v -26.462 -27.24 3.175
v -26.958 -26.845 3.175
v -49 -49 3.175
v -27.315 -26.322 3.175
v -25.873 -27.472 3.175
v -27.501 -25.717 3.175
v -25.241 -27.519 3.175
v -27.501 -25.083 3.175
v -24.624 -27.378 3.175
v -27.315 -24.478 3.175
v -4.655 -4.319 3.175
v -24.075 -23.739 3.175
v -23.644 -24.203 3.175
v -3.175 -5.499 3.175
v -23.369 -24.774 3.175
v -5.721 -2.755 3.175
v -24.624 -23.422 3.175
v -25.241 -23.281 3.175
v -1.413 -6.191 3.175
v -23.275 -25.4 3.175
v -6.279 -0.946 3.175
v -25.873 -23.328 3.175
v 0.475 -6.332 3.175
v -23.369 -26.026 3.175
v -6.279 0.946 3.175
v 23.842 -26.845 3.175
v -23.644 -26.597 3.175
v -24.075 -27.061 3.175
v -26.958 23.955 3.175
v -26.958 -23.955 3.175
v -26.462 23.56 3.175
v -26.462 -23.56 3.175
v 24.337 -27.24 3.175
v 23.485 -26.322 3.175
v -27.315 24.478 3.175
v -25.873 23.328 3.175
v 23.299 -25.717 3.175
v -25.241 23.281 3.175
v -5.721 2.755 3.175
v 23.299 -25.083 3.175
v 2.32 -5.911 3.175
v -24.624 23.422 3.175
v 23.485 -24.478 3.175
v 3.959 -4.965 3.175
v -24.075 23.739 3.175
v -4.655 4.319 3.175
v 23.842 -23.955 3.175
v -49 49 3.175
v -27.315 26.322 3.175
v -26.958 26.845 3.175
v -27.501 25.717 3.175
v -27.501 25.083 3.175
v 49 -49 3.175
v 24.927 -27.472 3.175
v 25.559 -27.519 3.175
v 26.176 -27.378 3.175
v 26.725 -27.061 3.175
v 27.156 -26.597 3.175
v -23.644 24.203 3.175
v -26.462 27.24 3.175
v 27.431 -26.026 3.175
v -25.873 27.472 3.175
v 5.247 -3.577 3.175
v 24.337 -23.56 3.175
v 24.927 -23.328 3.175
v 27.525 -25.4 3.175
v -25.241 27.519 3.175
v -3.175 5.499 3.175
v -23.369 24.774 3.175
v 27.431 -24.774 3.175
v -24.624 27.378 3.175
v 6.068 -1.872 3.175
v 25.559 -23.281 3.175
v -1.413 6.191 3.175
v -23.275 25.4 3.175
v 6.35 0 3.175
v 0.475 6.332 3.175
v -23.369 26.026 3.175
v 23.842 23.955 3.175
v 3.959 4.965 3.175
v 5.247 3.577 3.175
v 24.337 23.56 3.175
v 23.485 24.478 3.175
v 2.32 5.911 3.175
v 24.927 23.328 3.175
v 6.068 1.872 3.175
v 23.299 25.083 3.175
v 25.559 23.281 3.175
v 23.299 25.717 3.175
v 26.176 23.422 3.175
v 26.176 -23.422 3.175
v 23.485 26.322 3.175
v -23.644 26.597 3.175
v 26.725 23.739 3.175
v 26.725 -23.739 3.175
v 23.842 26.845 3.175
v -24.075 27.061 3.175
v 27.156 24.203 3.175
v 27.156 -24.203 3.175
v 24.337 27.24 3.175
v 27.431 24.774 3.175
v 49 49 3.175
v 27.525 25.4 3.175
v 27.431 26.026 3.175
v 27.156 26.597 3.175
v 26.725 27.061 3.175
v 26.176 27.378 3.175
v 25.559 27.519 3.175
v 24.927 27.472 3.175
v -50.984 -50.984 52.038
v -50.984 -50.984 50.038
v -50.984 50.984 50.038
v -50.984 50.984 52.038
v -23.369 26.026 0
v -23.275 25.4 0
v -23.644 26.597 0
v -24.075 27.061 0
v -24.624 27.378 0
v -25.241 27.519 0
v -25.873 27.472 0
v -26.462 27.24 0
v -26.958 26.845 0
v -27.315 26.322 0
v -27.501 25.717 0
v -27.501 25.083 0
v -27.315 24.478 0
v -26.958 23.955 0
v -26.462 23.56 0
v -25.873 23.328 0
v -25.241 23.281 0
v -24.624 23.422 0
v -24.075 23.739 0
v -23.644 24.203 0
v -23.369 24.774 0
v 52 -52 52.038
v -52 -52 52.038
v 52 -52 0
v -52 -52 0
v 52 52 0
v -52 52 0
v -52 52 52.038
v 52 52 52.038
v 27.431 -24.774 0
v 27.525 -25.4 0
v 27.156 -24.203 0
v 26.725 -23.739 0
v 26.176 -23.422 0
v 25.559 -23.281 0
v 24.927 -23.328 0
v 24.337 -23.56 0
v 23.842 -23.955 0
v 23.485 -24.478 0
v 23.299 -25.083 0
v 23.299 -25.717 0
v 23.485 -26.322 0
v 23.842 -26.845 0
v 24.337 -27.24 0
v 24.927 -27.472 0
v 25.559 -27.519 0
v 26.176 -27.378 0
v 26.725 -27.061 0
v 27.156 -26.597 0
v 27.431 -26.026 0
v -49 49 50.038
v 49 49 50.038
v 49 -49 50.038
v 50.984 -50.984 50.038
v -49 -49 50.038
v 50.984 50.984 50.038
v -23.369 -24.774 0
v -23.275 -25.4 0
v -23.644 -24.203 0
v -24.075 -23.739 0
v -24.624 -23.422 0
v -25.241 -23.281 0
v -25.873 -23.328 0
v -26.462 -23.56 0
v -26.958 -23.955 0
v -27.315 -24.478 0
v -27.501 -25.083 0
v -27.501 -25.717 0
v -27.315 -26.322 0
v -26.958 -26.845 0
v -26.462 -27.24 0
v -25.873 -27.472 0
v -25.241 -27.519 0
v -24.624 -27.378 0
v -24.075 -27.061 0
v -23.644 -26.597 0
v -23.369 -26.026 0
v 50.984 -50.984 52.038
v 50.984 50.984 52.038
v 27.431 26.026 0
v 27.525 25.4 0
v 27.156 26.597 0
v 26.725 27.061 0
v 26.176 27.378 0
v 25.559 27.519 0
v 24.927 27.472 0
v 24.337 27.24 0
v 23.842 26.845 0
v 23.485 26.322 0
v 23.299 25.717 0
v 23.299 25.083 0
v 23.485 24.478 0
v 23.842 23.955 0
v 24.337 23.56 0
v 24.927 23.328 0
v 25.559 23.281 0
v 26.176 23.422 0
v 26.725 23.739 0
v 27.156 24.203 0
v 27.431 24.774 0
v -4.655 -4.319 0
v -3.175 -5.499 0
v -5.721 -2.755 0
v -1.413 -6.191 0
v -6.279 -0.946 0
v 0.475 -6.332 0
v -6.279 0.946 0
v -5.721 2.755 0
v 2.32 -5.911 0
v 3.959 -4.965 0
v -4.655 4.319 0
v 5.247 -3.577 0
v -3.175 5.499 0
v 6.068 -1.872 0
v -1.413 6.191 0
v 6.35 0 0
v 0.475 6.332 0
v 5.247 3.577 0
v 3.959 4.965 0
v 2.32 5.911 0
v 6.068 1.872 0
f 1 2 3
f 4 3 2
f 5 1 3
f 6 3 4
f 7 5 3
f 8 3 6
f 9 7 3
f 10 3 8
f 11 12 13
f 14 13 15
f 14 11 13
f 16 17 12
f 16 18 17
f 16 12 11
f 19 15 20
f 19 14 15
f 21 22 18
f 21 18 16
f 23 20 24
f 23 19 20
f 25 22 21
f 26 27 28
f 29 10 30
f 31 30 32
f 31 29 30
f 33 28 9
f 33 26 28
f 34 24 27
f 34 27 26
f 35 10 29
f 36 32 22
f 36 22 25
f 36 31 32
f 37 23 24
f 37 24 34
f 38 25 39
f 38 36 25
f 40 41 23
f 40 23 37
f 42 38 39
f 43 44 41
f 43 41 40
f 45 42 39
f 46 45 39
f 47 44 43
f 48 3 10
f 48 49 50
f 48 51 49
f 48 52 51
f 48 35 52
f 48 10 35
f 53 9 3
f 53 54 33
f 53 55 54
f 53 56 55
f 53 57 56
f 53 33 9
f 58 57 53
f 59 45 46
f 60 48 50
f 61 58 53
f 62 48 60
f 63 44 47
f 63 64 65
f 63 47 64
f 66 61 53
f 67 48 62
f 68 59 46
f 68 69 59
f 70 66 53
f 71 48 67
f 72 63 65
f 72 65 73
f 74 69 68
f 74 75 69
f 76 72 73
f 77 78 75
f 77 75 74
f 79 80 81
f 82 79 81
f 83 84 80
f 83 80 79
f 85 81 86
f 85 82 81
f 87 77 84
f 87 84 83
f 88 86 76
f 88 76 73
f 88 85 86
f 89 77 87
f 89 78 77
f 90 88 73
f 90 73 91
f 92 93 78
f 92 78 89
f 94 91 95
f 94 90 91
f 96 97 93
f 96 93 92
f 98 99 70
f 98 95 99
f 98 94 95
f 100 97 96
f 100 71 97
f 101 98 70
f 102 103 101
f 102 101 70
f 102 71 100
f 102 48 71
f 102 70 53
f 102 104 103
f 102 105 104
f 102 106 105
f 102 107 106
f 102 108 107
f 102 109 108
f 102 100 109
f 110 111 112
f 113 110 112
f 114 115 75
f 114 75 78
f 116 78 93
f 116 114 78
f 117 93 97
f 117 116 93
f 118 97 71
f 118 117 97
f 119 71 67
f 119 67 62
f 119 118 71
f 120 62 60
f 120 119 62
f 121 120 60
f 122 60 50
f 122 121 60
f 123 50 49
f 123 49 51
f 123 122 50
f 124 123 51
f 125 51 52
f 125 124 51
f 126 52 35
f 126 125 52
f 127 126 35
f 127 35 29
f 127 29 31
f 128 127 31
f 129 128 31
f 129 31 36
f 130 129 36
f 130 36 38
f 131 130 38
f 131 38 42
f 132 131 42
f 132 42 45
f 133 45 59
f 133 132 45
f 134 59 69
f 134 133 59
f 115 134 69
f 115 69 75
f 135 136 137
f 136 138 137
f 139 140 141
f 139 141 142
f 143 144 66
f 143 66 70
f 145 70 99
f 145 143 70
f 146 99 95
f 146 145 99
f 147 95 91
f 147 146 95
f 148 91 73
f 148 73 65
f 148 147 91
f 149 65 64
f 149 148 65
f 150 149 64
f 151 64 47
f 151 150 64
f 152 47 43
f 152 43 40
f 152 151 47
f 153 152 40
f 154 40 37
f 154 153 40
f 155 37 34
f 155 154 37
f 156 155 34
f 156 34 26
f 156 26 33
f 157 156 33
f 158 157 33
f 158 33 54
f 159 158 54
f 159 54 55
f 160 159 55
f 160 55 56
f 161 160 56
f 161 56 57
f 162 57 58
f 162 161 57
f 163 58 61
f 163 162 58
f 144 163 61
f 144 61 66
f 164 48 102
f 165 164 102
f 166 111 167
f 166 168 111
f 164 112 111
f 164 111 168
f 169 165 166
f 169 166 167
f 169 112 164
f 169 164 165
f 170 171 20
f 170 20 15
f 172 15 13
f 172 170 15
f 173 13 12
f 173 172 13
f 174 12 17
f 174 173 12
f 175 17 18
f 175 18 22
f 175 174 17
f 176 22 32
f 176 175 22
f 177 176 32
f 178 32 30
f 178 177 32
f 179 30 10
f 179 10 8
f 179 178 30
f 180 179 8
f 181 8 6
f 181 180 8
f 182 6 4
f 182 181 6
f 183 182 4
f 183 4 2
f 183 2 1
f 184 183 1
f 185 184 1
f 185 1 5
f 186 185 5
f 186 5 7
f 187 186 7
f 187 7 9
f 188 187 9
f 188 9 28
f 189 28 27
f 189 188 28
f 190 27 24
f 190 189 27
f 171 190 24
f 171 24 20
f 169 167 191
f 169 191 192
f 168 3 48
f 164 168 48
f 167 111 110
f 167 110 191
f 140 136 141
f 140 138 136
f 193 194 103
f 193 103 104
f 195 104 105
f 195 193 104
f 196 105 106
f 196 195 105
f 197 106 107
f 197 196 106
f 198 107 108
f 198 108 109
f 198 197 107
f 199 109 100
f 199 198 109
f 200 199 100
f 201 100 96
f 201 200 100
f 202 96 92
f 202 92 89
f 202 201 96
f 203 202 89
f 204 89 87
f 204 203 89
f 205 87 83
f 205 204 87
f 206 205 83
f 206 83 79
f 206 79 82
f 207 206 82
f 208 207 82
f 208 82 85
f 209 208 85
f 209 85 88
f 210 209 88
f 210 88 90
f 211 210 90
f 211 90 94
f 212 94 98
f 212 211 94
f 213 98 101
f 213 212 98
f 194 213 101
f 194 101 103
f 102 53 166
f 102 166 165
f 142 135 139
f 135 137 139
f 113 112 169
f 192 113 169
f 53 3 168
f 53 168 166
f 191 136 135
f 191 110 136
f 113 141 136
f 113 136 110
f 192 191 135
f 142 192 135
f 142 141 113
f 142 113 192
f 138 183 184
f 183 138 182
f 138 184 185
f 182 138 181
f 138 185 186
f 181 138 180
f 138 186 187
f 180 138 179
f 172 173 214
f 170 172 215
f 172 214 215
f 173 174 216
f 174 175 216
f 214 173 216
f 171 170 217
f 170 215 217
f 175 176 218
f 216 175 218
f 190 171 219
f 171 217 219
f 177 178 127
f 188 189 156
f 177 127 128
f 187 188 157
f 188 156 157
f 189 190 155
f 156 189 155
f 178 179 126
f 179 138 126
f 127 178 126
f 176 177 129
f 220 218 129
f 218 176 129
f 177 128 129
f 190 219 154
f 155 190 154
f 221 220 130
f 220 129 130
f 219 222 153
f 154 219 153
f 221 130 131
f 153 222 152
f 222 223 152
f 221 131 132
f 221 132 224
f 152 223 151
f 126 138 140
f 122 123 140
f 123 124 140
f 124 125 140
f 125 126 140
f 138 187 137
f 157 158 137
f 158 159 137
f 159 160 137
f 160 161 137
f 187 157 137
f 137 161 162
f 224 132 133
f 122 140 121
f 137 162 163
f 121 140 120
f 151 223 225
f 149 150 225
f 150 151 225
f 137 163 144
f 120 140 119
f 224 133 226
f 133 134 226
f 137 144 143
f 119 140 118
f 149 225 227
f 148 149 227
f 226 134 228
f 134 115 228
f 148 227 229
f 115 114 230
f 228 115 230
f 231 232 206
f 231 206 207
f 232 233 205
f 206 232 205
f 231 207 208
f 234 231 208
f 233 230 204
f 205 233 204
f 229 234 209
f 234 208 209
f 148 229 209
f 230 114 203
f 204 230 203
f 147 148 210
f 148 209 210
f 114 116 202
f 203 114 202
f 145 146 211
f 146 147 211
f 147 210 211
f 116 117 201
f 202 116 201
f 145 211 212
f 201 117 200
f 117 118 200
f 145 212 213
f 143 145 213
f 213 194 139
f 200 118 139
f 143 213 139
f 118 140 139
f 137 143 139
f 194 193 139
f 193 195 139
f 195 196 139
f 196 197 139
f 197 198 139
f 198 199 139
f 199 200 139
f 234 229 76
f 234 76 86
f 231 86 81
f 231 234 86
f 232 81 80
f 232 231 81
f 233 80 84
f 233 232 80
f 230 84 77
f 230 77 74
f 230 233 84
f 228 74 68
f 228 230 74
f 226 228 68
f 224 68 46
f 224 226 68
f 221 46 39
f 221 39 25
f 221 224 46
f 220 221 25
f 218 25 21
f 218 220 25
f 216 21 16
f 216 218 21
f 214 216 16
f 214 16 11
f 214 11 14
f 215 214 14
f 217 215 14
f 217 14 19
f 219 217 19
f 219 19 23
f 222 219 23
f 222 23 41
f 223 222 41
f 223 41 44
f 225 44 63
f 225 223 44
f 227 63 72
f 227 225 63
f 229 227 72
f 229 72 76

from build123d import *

# Parameters (mm, degrees)
SKETCH_W      = 104
SKETCH_H      = 104
SKETCH_R      = 2.125
SKETCH_R_2    = 6.35
PAD_DEPTH     = 3.175
SKETCH003_W   = 104
SKETCH003_H   = 104
SKETCH003_W_2 = 98
SKETCH003_H_2 = 98
PAD002_DEPTH  = 46.863
SKETCH004_W   = 104
SKETCH004_H   = 104
SKETCH004_W_2 = 101.968
SKETCH004_H_2 = 101.968
PAD003_DEPTH  = 2


with BuildPart() as part:
    # Sketch → Pad (new body)
    with BuildSketch(Plane.XY):
        Rectangle(SKETCH_W, SKETCH_H)
        with Locations((-25.399999, 25.399999)):
            Circle(SKETCH_R, mode=Mode.SUBTRACT)
        with Locations((25.399999, 25.399999)):
            Circle(SKETCH_R, mode=Mode.SUBTRACT)
        with Locations((25.399999, -25.399999)):
            Circle(SKETCH_R, mode=Mode.SUBTRACT)
        with Locations((-25.399999, -25.399999)):
            Circle(SKETCH_R, mode=Mode.SUBTRACT)
        Circle(SKETCH_R_2, mode=Mode.SUBTRACT)
    extrude(amount=PAD_DEPTH)

    # Sketch003 (on Face11 of Pad) → Pad002 (join)
    with BuildSketch(Plane.XY.offset(3.175)):
        Rectangle(SKETCH003_W, SKETCH003_H)
        Rectangle(SKETCH003_W_2, SKETCH003_H_2, mode=Mode.SUBTRACT)
    extrude(amount=PAD002_DEPTH)

    # Sketch004 (on Face14 of Pad002) → Pad003 (join)
    with BuildSketch(Plane.XY.offset(50.038)):
        Rectangle(SKETCH004_W, SKETCH004_H)
        Rectangle(SKETCH004_W_2, SKETCH004_H_2, mode=Mode.SUBTRACT)
    extrude(amount=PAD003_DEPTH)


solid = part.part
